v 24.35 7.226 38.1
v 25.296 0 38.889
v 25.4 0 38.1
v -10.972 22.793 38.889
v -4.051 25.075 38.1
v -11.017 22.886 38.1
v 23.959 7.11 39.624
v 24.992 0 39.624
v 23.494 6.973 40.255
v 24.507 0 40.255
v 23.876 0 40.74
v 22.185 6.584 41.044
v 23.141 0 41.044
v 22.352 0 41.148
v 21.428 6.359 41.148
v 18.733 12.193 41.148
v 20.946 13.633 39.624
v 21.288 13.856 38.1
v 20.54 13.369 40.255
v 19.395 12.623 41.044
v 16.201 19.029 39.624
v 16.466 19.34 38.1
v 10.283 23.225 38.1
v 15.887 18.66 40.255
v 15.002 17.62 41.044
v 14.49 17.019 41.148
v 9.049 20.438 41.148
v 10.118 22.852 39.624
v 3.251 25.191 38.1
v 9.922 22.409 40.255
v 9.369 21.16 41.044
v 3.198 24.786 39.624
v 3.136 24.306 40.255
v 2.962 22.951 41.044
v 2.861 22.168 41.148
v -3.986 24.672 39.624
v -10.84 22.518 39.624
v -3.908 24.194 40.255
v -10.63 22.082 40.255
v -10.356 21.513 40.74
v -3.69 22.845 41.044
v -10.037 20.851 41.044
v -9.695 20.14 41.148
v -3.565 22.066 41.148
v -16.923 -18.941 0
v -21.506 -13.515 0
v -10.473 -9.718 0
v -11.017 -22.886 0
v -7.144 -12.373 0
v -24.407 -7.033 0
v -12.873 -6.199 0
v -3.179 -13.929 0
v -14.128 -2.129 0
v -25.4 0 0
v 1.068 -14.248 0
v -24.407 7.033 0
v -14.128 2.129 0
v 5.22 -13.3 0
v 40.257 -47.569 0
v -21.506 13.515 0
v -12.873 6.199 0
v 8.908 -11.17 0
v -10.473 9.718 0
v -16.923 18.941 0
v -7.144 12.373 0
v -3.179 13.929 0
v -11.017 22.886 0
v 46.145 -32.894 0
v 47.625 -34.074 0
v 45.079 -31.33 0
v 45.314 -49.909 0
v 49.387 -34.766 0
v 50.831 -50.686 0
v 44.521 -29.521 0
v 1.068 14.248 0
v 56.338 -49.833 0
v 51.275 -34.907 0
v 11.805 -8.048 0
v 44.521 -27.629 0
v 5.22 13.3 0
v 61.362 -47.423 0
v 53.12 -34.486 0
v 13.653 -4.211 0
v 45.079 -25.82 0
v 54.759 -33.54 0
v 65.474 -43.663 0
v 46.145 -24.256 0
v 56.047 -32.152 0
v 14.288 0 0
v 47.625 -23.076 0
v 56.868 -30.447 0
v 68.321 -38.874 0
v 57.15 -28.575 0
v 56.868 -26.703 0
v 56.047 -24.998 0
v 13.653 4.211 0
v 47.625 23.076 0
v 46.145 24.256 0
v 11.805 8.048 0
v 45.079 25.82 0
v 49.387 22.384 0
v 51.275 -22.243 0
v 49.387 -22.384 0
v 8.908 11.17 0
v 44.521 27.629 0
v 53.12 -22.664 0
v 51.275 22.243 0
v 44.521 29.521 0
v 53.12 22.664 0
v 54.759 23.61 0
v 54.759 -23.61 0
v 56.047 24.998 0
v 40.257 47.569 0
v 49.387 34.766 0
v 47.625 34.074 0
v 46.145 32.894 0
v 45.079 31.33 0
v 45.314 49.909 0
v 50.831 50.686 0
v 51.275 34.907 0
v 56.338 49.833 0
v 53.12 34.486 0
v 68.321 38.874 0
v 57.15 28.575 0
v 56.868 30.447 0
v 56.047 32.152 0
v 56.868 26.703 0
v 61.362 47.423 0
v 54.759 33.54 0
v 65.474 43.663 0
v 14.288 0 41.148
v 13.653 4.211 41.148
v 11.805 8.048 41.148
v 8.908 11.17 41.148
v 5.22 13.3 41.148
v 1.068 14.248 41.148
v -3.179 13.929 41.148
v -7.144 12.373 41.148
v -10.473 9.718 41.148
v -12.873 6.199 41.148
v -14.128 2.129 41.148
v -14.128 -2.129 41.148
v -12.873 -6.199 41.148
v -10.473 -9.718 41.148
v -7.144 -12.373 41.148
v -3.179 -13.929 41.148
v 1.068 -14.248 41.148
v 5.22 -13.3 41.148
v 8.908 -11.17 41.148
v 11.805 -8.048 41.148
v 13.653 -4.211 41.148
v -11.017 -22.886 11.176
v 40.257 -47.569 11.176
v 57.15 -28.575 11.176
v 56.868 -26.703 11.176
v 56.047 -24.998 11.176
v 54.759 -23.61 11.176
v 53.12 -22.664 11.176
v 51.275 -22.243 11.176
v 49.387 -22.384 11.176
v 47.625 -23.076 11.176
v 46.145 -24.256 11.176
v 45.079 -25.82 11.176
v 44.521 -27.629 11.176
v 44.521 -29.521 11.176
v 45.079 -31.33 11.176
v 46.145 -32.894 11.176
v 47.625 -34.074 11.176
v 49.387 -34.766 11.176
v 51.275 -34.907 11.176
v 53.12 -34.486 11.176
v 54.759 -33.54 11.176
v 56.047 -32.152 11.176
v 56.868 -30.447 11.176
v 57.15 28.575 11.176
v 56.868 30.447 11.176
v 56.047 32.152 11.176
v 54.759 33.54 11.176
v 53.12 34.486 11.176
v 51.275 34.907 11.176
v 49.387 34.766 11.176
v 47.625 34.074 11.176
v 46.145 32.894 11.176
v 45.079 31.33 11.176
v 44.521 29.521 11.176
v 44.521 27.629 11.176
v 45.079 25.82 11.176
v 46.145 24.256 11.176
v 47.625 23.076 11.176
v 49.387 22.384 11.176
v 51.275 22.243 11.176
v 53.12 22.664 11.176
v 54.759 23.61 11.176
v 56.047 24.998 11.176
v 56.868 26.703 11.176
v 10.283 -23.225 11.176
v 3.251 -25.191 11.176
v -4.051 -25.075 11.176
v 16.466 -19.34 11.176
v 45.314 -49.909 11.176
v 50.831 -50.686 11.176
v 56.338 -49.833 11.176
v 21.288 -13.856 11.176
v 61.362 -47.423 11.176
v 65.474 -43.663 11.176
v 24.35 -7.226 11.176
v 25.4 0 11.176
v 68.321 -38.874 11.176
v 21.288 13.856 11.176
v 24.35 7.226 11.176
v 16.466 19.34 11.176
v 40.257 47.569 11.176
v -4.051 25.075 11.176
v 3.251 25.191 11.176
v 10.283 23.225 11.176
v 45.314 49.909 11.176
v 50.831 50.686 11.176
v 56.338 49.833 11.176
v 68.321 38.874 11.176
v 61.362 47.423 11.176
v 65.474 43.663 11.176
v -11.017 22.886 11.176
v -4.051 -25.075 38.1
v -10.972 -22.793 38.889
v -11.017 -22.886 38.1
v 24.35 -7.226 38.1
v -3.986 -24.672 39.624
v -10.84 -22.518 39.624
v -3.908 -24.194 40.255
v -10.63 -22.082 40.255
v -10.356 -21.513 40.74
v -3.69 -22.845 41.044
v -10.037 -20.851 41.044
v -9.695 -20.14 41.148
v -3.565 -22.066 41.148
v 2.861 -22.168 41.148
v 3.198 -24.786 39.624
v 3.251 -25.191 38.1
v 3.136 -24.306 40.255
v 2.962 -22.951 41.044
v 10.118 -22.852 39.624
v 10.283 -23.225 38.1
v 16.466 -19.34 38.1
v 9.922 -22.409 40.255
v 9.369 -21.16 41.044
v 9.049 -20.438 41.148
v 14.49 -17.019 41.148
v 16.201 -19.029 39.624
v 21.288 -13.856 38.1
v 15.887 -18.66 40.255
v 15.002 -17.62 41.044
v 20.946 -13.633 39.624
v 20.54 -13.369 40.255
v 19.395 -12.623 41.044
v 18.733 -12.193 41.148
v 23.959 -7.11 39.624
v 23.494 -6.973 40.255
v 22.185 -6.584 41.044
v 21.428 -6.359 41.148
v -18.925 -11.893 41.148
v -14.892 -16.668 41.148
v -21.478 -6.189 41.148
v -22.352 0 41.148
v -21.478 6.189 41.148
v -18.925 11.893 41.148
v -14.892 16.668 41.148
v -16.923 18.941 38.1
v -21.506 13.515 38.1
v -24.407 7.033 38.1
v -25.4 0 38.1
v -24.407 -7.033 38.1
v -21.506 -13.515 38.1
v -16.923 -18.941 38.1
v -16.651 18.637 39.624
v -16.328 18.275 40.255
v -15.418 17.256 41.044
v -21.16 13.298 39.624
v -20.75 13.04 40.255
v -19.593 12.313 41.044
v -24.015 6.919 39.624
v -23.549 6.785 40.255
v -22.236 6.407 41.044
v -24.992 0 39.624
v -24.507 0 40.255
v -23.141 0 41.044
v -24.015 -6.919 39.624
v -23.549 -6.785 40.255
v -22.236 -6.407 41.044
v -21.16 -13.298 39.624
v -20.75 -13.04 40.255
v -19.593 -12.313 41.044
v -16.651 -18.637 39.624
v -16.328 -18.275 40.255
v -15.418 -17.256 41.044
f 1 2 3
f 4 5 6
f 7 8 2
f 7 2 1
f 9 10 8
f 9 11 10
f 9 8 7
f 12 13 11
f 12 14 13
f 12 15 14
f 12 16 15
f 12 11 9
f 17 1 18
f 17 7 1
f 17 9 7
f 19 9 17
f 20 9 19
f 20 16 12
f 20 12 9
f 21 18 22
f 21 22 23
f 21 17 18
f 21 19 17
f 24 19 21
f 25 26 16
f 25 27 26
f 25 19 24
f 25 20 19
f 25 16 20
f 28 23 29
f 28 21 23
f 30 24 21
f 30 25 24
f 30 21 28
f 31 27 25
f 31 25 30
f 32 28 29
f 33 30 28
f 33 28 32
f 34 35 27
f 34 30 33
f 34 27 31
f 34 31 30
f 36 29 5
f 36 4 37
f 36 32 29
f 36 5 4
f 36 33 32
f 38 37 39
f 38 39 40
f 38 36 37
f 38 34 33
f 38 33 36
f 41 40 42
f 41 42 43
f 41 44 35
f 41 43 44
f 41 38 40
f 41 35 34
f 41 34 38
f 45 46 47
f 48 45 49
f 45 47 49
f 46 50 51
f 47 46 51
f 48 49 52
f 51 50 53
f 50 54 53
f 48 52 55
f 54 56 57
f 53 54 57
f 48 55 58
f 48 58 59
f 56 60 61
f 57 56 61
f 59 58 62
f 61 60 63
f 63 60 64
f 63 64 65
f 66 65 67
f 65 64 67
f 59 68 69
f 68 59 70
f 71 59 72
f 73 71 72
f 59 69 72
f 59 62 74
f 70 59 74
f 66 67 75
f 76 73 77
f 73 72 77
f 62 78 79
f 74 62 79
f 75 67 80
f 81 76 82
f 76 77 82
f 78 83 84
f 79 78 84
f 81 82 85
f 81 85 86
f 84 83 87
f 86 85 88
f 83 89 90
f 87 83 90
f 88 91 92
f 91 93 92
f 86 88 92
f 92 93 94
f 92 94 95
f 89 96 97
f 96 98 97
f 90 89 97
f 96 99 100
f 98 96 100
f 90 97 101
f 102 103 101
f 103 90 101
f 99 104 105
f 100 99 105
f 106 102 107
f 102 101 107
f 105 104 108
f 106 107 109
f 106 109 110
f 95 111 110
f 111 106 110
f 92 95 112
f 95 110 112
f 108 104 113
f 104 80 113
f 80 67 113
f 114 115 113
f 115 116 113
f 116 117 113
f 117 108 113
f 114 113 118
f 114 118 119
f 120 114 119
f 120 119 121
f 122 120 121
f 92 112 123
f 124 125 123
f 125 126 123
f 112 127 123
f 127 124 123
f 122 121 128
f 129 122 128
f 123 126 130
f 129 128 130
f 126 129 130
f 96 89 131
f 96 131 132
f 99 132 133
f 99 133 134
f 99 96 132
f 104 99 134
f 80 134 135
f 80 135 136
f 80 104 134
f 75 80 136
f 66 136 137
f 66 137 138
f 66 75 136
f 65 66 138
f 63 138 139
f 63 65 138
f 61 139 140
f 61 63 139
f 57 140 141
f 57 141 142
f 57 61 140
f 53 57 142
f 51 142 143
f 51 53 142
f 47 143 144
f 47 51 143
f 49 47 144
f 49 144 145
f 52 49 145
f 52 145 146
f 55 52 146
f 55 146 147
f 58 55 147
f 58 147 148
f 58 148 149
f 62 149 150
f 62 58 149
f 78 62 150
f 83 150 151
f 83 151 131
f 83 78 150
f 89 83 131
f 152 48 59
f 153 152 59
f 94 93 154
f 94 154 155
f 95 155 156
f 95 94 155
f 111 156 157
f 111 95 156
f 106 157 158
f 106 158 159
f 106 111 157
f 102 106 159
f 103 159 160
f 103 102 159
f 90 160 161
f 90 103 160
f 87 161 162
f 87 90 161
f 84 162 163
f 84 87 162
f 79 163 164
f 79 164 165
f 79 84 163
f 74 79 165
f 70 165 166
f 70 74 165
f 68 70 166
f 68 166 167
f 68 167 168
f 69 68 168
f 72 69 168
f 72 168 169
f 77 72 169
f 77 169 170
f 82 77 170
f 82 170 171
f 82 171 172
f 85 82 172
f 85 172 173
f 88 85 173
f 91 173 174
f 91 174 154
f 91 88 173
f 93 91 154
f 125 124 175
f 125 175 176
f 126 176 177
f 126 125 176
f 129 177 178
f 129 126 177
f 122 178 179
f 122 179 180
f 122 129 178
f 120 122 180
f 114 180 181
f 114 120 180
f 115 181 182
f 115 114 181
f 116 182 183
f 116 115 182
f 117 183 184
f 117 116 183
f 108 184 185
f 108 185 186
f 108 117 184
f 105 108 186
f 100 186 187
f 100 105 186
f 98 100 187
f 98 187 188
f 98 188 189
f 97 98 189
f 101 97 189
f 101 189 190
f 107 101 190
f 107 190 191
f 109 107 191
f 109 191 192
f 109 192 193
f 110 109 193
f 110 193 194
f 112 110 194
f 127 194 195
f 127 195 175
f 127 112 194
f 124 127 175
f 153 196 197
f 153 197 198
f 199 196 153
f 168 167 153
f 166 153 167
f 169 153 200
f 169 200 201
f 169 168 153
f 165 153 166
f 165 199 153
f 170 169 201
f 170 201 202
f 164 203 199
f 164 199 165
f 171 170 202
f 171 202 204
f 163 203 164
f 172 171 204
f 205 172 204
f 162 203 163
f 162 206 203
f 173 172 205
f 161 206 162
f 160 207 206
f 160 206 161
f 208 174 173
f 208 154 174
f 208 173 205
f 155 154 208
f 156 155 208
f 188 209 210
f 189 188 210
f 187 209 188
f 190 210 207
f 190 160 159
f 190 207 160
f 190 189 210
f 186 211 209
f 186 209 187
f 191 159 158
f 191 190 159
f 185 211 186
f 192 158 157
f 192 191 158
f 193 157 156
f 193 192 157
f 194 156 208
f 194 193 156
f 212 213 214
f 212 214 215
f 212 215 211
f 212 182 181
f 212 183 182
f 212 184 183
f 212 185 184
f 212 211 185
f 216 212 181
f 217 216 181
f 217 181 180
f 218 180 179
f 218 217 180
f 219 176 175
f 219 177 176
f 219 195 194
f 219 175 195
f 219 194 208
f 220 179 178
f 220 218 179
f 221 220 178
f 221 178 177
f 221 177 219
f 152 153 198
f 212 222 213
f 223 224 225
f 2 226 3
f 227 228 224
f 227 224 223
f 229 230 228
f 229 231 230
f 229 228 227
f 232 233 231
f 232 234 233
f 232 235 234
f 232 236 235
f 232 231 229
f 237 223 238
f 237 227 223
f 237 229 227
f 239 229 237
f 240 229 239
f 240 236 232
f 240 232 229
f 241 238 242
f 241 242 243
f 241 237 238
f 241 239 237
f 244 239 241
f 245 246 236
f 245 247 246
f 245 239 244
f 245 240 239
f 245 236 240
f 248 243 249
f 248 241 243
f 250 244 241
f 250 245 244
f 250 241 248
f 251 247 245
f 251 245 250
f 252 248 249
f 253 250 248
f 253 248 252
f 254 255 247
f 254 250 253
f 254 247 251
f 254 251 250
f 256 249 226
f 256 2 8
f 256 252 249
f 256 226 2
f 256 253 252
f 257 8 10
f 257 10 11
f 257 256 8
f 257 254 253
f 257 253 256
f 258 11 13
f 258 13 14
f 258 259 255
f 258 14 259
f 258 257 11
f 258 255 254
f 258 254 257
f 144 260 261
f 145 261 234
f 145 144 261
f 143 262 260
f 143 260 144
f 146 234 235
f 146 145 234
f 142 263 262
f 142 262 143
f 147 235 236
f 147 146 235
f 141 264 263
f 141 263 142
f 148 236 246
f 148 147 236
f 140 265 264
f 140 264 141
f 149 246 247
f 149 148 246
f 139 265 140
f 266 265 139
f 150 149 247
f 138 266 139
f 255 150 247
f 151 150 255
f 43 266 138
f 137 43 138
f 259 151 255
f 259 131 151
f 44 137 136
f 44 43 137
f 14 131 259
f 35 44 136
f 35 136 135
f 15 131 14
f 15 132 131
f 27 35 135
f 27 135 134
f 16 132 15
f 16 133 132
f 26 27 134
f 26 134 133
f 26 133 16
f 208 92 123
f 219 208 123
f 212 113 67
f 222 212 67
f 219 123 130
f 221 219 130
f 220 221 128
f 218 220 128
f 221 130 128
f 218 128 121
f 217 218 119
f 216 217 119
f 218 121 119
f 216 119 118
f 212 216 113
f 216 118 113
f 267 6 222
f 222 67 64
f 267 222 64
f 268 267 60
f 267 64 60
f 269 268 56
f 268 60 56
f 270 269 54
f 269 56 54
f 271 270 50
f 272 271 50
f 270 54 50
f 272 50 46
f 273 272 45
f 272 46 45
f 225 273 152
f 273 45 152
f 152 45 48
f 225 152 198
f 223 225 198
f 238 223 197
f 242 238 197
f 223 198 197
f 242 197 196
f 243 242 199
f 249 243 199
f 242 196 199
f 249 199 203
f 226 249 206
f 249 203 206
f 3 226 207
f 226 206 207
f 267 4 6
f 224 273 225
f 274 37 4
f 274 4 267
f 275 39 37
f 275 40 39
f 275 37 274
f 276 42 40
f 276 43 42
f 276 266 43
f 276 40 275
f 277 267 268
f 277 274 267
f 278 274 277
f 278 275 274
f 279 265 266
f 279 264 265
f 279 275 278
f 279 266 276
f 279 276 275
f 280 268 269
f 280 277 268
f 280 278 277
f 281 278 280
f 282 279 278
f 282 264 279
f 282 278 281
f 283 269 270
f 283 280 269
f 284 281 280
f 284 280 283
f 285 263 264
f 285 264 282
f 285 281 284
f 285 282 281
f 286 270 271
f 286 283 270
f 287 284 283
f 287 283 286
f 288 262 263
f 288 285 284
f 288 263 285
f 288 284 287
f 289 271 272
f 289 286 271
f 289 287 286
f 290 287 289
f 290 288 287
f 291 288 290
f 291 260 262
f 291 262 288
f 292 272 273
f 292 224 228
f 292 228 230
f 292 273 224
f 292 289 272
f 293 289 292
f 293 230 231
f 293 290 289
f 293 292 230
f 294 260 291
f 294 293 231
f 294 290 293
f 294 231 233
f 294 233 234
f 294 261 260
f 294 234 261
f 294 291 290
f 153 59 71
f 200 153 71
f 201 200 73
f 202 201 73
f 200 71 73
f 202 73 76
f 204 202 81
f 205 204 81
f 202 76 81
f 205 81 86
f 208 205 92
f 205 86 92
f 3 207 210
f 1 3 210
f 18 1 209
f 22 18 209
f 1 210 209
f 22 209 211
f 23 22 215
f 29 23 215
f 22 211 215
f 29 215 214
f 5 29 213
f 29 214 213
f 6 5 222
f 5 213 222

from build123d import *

# Parameters (mm, degrees)
F0_R     = 6.35
F1_DEPTH = 11.176
F0_R_2   = 14.2875
F2_DEPTH = 41.148
F3_R     = 3.048


with BuildPart() as f1:
    # F0 (on Top) → F1 (new body)
    with BuildSketch(Plane.XY):
        with BuildLine():
            ThreePointArc((-11.017324, 22.886209), (13.515176, 21.505813), (25.4, 0))
            ThreePointArc((25.4, 0), (13.515176, -21.505813), (-11.017324, -22.886209))
            Line((-11.017324, -22.886209), (40.256642, -47.569279))
            ThreePointArc((40.256642, -47.569279), (56.337591, -49.833259), (68.321377, -38.873725))
            Line((68.321377, -38.873725), (68.321377, 0))
            Line((68.321377, 0), (68.321377, 38.873725))
            ThreePointArc((68.321377, 38.873725), (56.337591, 49.833259), (40.256642, 47.569279))
            Line((40.256642, 47.569279), (-11.017324, 22.886209))
        make_face()
        with Locations((50.8, -28.575)):
            Circle(F0_R, mode=Mode.SUBTRACT)
        with Locations((50.8, 28.575)):
            Circle(F0_R, mode=Mode.SUBTRACT)
    extrude(amount=F1_DEPTH)

    # F0 (on Top) → F2 (join)
    with BuildSketch(Plane.XY):
        with BuildLine():
            ThreePointArc((-11.017324, -22.886209), (13.515176, -21.505813), (25.4, 0))
            ThreePointArc((25.4, 0), (13.515176, 21.505813), (-11.017324, 22.886209))
            ThreePointArc((-11.017324, 22.886209), (-25.4, 0), (-11.017324, -22.886209))
        make_face()
        Circle(F0_R_2, mode=Mode.SUBTRACT)
    extrude(amount=F2_DEPTH)

    # F3
    f3_edges = [f1.edges().sort_by_distance(p)[0] for p in [
        (11.017324, -22.886209, 41.148),
    ]]
    fillet(f3_edges, radius=F3_R)


solid = f1.part
